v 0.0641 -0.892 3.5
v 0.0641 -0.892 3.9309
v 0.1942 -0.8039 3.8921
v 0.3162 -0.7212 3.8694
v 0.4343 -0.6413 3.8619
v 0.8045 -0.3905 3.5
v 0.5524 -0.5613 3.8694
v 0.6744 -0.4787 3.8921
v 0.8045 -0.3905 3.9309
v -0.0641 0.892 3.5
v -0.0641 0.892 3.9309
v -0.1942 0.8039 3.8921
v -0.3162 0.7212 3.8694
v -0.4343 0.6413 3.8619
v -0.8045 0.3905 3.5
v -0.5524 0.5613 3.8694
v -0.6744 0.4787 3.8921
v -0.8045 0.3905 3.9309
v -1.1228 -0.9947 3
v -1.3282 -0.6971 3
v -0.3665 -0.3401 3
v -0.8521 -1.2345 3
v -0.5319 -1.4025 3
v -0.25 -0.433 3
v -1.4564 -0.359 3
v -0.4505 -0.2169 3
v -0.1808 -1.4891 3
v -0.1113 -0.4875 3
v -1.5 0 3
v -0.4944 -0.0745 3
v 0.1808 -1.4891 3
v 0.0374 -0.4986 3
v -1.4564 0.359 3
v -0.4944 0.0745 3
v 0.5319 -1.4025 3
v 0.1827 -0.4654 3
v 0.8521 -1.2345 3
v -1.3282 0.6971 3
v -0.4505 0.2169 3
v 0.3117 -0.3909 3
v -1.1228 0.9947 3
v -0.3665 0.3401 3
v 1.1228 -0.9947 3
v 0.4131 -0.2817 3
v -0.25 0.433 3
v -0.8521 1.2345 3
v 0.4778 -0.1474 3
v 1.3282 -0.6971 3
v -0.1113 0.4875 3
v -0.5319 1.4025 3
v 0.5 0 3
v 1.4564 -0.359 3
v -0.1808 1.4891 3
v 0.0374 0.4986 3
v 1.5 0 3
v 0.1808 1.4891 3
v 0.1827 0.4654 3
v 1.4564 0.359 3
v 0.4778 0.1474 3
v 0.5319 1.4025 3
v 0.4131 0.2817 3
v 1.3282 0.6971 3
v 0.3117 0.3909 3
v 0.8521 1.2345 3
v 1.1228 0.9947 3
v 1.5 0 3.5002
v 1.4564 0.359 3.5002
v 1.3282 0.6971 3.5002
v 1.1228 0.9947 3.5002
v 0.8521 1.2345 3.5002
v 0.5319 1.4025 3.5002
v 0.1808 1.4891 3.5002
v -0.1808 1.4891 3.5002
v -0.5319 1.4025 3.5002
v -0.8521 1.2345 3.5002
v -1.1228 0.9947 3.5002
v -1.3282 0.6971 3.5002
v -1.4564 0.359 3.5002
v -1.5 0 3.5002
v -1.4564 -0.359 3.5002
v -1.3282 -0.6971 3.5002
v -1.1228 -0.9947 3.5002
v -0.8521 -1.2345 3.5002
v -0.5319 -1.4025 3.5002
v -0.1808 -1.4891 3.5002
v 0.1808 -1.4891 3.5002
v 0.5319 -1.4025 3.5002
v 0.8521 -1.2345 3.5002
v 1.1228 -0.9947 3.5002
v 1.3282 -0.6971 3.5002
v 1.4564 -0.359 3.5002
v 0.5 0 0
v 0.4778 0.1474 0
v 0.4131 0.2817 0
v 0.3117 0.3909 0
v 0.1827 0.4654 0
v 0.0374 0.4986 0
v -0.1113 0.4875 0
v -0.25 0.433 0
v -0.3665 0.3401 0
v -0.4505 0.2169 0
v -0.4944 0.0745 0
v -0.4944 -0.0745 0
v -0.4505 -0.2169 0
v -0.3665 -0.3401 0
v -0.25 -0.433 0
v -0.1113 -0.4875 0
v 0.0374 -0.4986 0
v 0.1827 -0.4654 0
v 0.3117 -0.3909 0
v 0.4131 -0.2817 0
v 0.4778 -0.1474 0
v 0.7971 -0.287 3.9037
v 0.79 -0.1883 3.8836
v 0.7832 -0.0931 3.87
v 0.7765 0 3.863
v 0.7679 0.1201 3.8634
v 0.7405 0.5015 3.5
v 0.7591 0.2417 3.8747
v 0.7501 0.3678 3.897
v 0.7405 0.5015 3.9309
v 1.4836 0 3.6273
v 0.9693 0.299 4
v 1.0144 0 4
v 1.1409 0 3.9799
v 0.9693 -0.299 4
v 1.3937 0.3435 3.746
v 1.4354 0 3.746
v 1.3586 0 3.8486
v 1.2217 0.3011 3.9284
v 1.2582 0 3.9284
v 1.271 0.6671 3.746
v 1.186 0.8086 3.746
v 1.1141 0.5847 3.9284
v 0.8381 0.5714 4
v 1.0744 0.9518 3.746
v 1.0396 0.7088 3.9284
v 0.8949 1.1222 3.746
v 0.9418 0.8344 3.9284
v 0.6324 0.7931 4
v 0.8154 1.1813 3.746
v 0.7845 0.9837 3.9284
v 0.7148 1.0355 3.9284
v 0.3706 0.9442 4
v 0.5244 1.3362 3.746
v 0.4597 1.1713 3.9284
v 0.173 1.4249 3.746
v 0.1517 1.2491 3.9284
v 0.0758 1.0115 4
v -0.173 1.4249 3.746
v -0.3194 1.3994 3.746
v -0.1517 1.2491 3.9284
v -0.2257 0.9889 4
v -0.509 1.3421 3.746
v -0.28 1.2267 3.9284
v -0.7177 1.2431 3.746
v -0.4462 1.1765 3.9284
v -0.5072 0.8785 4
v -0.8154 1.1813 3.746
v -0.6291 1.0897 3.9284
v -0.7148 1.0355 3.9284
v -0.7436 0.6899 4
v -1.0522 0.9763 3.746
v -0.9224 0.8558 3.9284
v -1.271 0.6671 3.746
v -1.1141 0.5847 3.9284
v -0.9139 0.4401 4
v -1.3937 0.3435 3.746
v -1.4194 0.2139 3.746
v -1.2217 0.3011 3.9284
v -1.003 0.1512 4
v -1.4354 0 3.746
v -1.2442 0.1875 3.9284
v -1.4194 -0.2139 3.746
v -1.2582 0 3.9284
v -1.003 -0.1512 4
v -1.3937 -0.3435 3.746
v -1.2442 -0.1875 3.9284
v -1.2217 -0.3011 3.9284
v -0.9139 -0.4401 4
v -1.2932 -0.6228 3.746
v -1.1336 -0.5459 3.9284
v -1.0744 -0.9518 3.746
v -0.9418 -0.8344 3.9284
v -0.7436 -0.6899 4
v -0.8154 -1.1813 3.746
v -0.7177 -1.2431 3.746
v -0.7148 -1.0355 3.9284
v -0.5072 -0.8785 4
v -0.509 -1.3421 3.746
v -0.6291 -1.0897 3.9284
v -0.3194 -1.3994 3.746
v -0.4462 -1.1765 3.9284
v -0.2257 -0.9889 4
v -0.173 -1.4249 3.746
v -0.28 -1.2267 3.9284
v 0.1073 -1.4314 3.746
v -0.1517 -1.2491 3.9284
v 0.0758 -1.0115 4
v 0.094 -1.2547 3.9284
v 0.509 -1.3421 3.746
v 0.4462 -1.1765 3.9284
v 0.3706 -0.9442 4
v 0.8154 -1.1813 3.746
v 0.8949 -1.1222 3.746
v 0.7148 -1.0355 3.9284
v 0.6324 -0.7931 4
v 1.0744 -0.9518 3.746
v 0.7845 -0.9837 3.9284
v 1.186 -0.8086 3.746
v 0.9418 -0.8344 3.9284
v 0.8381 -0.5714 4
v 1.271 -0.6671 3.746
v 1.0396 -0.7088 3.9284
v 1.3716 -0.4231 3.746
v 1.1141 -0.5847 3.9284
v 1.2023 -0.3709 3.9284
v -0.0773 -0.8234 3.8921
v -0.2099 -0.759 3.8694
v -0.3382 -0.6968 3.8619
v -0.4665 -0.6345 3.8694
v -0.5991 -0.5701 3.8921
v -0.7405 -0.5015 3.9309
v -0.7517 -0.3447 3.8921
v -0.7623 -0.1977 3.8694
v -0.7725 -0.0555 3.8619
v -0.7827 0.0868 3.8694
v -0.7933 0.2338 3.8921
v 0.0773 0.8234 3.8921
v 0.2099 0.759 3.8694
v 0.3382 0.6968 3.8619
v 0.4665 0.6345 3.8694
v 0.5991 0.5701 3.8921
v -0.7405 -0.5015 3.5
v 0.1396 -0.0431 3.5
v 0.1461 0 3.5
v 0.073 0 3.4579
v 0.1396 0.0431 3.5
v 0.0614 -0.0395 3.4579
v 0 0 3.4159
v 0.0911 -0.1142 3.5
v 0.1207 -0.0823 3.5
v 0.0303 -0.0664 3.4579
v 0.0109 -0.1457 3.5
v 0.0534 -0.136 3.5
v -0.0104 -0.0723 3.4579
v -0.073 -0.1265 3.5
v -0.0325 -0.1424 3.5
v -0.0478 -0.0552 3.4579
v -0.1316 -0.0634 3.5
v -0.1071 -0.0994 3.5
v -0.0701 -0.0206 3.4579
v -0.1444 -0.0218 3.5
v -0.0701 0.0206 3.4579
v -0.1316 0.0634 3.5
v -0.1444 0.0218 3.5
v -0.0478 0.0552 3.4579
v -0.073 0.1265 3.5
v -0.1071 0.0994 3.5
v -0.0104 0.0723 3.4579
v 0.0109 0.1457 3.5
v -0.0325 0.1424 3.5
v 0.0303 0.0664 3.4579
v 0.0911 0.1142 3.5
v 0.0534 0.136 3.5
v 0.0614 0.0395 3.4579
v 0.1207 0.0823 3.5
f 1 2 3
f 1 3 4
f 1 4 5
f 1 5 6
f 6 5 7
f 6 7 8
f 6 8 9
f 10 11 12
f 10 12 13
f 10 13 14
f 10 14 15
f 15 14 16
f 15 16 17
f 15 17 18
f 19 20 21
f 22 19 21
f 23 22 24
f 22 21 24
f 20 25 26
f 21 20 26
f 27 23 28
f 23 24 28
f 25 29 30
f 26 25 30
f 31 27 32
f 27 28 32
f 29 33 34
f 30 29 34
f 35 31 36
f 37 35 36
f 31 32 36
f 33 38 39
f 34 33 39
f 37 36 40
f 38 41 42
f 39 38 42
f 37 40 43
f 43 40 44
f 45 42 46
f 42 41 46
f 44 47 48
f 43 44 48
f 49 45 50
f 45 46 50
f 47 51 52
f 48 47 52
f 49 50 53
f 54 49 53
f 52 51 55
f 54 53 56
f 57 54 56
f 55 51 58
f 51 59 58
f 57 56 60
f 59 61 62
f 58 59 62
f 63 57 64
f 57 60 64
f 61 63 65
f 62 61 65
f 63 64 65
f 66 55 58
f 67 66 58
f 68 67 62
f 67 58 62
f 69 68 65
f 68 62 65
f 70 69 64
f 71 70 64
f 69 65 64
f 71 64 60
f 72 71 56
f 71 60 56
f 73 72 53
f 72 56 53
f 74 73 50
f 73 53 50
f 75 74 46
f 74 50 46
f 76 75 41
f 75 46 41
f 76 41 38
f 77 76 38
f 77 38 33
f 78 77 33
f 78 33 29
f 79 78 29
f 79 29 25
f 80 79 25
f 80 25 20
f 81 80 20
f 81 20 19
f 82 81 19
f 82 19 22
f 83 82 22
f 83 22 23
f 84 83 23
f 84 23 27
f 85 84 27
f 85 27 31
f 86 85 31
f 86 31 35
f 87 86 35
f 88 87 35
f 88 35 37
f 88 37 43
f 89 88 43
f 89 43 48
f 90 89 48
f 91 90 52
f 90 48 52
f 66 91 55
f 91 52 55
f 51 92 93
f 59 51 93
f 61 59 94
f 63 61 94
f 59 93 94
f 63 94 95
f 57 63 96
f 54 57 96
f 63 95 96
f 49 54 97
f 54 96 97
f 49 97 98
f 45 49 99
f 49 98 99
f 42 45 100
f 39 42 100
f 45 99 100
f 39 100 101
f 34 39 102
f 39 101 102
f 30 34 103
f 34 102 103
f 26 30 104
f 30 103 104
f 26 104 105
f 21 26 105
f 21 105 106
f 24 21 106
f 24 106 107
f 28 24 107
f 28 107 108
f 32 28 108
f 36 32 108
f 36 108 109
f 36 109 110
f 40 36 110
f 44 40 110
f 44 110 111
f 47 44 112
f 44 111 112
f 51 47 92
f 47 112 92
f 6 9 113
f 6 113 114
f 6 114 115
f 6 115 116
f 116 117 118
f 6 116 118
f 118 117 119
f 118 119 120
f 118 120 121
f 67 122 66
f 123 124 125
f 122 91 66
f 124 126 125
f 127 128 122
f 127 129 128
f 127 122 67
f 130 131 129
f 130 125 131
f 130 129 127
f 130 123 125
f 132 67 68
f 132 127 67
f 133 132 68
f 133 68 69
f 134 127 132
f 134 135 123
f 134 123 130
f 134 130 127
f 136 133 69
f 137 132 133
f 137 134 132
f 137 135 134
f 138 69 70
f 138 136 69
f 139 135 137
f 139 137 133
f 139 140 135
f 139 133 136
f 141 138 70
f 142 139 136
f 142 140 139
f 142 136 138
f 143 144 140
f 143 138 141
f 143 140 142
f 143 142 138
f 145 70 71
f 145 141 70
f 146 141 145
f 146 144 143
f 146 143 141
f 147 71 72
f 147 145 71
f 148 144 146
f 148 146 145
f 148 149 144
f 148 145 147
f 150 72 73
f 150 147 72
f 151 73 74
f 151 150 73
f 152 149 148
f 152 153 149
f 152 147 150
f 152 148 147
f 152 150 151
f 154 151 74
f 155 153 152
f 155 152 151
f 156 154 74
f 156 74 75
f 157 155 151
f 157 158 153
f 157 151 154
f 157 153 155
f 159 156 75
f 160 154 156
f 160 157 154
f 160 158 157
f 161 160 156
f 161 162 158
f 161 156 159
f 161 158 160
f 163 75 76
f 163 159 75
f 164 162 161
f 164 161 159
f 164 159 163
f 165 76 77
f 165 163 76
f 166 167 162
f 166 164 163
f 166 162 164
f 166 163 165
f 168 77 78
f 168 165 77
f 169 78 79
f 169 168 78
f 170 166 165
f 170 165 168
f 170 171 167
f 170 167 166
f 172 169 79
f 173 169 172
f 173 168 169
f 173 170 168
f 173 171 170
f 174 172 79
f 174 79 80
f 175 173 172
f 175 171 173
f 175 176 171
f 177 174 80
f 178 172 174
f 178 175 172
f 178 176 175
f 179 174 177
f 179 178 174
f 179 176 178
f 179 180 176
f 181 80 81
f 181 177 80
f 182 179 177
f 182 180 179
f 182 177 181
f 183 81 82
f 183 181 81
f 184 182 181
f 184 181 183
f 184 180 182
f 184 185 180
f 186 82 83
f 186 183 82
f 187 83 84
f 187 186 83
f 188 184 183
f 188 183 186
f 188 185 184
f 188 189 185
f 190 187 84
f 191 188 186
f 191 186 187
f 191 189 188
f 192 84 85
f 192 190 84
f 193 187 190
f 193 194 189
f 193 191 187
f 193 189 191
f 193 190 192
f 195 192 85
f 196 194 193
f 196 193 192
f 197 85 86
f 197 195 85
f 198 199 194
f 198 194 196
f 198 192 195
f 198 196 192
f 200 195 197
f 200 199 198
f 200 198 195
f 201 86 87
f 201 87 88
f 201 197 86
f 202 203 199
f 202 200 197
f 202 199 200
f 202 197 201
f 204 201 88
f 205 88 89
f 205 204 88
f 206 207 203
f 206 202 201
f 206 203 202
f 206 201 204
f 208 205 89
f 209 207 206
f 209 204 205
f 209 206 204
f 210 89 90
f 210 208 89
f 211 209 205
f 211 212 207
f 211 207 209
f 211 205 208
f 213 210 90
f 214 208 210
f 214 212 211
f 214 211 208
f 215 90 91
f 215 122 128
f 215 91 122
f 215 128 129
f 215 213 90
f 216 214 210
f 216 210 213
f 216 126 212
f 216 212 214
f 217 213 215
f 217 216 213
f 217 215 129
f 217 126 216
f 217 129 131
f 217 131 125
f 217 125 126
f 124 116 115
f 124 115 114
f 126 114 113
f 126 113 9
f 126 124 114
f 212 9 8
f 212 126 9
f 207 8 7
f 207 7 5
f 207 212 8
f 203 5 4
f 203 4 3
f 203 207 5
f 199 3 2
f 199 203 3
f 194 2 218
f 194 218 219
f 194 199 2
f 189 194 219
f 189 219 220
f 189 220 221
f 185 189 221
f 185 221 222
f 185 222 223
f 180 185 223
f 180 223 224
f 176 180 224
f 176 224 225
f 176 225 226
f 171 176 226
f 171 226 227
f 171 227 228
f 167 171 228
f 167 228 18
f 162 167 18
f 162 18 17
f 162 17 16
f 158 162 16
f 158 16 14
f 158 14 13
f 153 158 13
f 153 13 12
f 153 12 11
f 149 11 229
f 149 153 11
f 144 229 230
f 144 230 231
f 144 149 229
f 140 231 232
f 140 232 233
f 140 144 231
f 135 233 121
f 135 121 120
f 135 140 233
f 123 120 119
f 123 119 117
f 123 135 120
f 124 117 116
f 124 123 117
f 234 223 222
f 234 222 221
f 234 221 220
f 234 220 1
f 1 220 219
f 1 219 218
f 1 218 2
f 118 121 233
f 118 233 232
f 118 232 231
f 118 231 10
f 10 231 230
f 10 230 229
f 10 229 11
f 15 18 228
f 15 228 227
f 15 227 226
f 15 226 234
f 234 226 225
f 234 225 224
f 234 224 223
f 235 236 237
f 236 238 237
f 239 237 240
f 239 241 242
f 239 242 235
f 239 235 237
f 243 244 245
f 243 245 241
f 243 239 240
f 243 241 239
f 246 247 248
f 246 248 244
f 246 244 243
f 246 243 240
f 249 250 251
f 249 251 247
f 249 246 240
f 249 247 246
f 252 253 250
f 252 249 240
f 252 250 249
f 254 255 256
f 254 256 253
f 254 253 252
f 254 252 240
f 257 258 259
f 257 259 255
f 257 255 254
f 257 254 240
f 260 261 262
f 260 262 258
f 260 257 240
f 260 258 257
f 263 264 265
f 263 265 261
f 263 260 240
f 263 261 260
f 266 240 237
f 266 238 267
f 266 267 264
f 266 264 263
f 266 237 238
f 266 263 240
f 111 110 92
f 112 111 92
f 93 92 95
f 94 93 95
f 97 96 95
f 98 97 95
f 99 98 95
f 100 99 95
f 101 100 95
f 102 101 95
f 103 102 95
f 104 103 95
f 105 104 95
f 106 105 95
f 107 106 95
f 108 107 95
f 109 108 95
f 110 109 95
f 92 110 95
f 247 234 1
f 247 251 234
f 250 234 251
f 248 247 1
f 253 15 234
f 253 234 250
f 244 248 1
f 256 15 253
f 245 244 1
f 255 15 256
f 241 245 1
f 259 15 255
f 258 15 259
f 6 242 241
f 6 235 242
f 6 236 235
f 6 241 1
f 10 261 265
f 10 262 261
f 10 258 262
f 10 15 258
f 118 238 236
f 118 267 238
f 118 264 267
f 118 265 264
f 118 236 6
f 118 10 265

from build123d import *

# Parameters (mm, degrees)
SKETCH1_R           = 0.5
BOSS_EXTRUDE1_DEPTH = 3
SKETCH2_R           = 1.5
BOSS_EXTRUDE2_DEPTH = 1
CUT_EXTRUDE2_DEPTH  = 0.5
FILLET1_R           = 0.5


with BuildPart() as part:
    # Sketch1 → Boss-Extrude1 (new body)
    with BuildSketch(Plane.XY):
        Circle(SKETCH1_R)
    extrude(amount=BOSS_EXTRUDE1_DEPTH)

    # Sketch2 → Boss-Extrude2 (add)
    with BuildSketch(Plane.XY.offset(3)):
        Circle(SKETCH2_R)
    extrude(amount=BOSS_EXTRUDE2_DEPTH)

    # Sketch3 → Cut-Revolve1 (revolve, cut)
    with BuildSketch(Plane(origin=(0, 0, 0), x_dir=(1, 0, 0), z_dir=(0, 1, 0))):
        Polygon((0, -3.415887941), (1.01436748, -4), (0, -4), align=None)
    revolve(axis=Axis((0, 0, 4), (0, 0, -1)), mode=Mode.SUBTRACT)

    # Sketch4 → Cut-Extrude2 (cut)
    with BuildSketch(Plane.XY.offset(4)):
        Polygon((-0.064066106, 0.892020738), (-0.804545672, 0.390527494), (-0.740479567, -0.501493244), (0.064066106, -0.892020738), (0.804545672, -0.390527494), (0.740479567, 0.501493244), align=None)
    extrude(amount=-CUT_EXTRUDE2_DEPTH, mode=Mode.SUBTRACT)

    # Fillet1
    # the kernel refuses this fillet: 0.5 mm, written as the material it takes off along each edge
    with BuildSketch(Plane(origin=(0, 0, 4), x_dir=(1, 0, 0), z_dir=(0, -1, 0))) as fillet1_piece_1:
        with BuildLine():
            CenterArc((1, -0.499793533), FILLET1_R, 0, 88.353381389)
            Line((1.01436748, 0), (1.01465483, 0.009995871))
            ThreePointArc((1.01465483, 0.009995871), (1.25718374, 0.01), (1.5, 0.01))
            Line((1.5, 0.01), (1.51, 0))
            Line((1.51, 0), (1.51, -0.499793533))
            Line((1.51, -0.499793533), (1.5, -0.499793533))
        make_face()
    revolve(axis=Axis((0, 0, 4), (0, 0, 1)), mode=Mode.SUBTRACT)


solid = part.part
